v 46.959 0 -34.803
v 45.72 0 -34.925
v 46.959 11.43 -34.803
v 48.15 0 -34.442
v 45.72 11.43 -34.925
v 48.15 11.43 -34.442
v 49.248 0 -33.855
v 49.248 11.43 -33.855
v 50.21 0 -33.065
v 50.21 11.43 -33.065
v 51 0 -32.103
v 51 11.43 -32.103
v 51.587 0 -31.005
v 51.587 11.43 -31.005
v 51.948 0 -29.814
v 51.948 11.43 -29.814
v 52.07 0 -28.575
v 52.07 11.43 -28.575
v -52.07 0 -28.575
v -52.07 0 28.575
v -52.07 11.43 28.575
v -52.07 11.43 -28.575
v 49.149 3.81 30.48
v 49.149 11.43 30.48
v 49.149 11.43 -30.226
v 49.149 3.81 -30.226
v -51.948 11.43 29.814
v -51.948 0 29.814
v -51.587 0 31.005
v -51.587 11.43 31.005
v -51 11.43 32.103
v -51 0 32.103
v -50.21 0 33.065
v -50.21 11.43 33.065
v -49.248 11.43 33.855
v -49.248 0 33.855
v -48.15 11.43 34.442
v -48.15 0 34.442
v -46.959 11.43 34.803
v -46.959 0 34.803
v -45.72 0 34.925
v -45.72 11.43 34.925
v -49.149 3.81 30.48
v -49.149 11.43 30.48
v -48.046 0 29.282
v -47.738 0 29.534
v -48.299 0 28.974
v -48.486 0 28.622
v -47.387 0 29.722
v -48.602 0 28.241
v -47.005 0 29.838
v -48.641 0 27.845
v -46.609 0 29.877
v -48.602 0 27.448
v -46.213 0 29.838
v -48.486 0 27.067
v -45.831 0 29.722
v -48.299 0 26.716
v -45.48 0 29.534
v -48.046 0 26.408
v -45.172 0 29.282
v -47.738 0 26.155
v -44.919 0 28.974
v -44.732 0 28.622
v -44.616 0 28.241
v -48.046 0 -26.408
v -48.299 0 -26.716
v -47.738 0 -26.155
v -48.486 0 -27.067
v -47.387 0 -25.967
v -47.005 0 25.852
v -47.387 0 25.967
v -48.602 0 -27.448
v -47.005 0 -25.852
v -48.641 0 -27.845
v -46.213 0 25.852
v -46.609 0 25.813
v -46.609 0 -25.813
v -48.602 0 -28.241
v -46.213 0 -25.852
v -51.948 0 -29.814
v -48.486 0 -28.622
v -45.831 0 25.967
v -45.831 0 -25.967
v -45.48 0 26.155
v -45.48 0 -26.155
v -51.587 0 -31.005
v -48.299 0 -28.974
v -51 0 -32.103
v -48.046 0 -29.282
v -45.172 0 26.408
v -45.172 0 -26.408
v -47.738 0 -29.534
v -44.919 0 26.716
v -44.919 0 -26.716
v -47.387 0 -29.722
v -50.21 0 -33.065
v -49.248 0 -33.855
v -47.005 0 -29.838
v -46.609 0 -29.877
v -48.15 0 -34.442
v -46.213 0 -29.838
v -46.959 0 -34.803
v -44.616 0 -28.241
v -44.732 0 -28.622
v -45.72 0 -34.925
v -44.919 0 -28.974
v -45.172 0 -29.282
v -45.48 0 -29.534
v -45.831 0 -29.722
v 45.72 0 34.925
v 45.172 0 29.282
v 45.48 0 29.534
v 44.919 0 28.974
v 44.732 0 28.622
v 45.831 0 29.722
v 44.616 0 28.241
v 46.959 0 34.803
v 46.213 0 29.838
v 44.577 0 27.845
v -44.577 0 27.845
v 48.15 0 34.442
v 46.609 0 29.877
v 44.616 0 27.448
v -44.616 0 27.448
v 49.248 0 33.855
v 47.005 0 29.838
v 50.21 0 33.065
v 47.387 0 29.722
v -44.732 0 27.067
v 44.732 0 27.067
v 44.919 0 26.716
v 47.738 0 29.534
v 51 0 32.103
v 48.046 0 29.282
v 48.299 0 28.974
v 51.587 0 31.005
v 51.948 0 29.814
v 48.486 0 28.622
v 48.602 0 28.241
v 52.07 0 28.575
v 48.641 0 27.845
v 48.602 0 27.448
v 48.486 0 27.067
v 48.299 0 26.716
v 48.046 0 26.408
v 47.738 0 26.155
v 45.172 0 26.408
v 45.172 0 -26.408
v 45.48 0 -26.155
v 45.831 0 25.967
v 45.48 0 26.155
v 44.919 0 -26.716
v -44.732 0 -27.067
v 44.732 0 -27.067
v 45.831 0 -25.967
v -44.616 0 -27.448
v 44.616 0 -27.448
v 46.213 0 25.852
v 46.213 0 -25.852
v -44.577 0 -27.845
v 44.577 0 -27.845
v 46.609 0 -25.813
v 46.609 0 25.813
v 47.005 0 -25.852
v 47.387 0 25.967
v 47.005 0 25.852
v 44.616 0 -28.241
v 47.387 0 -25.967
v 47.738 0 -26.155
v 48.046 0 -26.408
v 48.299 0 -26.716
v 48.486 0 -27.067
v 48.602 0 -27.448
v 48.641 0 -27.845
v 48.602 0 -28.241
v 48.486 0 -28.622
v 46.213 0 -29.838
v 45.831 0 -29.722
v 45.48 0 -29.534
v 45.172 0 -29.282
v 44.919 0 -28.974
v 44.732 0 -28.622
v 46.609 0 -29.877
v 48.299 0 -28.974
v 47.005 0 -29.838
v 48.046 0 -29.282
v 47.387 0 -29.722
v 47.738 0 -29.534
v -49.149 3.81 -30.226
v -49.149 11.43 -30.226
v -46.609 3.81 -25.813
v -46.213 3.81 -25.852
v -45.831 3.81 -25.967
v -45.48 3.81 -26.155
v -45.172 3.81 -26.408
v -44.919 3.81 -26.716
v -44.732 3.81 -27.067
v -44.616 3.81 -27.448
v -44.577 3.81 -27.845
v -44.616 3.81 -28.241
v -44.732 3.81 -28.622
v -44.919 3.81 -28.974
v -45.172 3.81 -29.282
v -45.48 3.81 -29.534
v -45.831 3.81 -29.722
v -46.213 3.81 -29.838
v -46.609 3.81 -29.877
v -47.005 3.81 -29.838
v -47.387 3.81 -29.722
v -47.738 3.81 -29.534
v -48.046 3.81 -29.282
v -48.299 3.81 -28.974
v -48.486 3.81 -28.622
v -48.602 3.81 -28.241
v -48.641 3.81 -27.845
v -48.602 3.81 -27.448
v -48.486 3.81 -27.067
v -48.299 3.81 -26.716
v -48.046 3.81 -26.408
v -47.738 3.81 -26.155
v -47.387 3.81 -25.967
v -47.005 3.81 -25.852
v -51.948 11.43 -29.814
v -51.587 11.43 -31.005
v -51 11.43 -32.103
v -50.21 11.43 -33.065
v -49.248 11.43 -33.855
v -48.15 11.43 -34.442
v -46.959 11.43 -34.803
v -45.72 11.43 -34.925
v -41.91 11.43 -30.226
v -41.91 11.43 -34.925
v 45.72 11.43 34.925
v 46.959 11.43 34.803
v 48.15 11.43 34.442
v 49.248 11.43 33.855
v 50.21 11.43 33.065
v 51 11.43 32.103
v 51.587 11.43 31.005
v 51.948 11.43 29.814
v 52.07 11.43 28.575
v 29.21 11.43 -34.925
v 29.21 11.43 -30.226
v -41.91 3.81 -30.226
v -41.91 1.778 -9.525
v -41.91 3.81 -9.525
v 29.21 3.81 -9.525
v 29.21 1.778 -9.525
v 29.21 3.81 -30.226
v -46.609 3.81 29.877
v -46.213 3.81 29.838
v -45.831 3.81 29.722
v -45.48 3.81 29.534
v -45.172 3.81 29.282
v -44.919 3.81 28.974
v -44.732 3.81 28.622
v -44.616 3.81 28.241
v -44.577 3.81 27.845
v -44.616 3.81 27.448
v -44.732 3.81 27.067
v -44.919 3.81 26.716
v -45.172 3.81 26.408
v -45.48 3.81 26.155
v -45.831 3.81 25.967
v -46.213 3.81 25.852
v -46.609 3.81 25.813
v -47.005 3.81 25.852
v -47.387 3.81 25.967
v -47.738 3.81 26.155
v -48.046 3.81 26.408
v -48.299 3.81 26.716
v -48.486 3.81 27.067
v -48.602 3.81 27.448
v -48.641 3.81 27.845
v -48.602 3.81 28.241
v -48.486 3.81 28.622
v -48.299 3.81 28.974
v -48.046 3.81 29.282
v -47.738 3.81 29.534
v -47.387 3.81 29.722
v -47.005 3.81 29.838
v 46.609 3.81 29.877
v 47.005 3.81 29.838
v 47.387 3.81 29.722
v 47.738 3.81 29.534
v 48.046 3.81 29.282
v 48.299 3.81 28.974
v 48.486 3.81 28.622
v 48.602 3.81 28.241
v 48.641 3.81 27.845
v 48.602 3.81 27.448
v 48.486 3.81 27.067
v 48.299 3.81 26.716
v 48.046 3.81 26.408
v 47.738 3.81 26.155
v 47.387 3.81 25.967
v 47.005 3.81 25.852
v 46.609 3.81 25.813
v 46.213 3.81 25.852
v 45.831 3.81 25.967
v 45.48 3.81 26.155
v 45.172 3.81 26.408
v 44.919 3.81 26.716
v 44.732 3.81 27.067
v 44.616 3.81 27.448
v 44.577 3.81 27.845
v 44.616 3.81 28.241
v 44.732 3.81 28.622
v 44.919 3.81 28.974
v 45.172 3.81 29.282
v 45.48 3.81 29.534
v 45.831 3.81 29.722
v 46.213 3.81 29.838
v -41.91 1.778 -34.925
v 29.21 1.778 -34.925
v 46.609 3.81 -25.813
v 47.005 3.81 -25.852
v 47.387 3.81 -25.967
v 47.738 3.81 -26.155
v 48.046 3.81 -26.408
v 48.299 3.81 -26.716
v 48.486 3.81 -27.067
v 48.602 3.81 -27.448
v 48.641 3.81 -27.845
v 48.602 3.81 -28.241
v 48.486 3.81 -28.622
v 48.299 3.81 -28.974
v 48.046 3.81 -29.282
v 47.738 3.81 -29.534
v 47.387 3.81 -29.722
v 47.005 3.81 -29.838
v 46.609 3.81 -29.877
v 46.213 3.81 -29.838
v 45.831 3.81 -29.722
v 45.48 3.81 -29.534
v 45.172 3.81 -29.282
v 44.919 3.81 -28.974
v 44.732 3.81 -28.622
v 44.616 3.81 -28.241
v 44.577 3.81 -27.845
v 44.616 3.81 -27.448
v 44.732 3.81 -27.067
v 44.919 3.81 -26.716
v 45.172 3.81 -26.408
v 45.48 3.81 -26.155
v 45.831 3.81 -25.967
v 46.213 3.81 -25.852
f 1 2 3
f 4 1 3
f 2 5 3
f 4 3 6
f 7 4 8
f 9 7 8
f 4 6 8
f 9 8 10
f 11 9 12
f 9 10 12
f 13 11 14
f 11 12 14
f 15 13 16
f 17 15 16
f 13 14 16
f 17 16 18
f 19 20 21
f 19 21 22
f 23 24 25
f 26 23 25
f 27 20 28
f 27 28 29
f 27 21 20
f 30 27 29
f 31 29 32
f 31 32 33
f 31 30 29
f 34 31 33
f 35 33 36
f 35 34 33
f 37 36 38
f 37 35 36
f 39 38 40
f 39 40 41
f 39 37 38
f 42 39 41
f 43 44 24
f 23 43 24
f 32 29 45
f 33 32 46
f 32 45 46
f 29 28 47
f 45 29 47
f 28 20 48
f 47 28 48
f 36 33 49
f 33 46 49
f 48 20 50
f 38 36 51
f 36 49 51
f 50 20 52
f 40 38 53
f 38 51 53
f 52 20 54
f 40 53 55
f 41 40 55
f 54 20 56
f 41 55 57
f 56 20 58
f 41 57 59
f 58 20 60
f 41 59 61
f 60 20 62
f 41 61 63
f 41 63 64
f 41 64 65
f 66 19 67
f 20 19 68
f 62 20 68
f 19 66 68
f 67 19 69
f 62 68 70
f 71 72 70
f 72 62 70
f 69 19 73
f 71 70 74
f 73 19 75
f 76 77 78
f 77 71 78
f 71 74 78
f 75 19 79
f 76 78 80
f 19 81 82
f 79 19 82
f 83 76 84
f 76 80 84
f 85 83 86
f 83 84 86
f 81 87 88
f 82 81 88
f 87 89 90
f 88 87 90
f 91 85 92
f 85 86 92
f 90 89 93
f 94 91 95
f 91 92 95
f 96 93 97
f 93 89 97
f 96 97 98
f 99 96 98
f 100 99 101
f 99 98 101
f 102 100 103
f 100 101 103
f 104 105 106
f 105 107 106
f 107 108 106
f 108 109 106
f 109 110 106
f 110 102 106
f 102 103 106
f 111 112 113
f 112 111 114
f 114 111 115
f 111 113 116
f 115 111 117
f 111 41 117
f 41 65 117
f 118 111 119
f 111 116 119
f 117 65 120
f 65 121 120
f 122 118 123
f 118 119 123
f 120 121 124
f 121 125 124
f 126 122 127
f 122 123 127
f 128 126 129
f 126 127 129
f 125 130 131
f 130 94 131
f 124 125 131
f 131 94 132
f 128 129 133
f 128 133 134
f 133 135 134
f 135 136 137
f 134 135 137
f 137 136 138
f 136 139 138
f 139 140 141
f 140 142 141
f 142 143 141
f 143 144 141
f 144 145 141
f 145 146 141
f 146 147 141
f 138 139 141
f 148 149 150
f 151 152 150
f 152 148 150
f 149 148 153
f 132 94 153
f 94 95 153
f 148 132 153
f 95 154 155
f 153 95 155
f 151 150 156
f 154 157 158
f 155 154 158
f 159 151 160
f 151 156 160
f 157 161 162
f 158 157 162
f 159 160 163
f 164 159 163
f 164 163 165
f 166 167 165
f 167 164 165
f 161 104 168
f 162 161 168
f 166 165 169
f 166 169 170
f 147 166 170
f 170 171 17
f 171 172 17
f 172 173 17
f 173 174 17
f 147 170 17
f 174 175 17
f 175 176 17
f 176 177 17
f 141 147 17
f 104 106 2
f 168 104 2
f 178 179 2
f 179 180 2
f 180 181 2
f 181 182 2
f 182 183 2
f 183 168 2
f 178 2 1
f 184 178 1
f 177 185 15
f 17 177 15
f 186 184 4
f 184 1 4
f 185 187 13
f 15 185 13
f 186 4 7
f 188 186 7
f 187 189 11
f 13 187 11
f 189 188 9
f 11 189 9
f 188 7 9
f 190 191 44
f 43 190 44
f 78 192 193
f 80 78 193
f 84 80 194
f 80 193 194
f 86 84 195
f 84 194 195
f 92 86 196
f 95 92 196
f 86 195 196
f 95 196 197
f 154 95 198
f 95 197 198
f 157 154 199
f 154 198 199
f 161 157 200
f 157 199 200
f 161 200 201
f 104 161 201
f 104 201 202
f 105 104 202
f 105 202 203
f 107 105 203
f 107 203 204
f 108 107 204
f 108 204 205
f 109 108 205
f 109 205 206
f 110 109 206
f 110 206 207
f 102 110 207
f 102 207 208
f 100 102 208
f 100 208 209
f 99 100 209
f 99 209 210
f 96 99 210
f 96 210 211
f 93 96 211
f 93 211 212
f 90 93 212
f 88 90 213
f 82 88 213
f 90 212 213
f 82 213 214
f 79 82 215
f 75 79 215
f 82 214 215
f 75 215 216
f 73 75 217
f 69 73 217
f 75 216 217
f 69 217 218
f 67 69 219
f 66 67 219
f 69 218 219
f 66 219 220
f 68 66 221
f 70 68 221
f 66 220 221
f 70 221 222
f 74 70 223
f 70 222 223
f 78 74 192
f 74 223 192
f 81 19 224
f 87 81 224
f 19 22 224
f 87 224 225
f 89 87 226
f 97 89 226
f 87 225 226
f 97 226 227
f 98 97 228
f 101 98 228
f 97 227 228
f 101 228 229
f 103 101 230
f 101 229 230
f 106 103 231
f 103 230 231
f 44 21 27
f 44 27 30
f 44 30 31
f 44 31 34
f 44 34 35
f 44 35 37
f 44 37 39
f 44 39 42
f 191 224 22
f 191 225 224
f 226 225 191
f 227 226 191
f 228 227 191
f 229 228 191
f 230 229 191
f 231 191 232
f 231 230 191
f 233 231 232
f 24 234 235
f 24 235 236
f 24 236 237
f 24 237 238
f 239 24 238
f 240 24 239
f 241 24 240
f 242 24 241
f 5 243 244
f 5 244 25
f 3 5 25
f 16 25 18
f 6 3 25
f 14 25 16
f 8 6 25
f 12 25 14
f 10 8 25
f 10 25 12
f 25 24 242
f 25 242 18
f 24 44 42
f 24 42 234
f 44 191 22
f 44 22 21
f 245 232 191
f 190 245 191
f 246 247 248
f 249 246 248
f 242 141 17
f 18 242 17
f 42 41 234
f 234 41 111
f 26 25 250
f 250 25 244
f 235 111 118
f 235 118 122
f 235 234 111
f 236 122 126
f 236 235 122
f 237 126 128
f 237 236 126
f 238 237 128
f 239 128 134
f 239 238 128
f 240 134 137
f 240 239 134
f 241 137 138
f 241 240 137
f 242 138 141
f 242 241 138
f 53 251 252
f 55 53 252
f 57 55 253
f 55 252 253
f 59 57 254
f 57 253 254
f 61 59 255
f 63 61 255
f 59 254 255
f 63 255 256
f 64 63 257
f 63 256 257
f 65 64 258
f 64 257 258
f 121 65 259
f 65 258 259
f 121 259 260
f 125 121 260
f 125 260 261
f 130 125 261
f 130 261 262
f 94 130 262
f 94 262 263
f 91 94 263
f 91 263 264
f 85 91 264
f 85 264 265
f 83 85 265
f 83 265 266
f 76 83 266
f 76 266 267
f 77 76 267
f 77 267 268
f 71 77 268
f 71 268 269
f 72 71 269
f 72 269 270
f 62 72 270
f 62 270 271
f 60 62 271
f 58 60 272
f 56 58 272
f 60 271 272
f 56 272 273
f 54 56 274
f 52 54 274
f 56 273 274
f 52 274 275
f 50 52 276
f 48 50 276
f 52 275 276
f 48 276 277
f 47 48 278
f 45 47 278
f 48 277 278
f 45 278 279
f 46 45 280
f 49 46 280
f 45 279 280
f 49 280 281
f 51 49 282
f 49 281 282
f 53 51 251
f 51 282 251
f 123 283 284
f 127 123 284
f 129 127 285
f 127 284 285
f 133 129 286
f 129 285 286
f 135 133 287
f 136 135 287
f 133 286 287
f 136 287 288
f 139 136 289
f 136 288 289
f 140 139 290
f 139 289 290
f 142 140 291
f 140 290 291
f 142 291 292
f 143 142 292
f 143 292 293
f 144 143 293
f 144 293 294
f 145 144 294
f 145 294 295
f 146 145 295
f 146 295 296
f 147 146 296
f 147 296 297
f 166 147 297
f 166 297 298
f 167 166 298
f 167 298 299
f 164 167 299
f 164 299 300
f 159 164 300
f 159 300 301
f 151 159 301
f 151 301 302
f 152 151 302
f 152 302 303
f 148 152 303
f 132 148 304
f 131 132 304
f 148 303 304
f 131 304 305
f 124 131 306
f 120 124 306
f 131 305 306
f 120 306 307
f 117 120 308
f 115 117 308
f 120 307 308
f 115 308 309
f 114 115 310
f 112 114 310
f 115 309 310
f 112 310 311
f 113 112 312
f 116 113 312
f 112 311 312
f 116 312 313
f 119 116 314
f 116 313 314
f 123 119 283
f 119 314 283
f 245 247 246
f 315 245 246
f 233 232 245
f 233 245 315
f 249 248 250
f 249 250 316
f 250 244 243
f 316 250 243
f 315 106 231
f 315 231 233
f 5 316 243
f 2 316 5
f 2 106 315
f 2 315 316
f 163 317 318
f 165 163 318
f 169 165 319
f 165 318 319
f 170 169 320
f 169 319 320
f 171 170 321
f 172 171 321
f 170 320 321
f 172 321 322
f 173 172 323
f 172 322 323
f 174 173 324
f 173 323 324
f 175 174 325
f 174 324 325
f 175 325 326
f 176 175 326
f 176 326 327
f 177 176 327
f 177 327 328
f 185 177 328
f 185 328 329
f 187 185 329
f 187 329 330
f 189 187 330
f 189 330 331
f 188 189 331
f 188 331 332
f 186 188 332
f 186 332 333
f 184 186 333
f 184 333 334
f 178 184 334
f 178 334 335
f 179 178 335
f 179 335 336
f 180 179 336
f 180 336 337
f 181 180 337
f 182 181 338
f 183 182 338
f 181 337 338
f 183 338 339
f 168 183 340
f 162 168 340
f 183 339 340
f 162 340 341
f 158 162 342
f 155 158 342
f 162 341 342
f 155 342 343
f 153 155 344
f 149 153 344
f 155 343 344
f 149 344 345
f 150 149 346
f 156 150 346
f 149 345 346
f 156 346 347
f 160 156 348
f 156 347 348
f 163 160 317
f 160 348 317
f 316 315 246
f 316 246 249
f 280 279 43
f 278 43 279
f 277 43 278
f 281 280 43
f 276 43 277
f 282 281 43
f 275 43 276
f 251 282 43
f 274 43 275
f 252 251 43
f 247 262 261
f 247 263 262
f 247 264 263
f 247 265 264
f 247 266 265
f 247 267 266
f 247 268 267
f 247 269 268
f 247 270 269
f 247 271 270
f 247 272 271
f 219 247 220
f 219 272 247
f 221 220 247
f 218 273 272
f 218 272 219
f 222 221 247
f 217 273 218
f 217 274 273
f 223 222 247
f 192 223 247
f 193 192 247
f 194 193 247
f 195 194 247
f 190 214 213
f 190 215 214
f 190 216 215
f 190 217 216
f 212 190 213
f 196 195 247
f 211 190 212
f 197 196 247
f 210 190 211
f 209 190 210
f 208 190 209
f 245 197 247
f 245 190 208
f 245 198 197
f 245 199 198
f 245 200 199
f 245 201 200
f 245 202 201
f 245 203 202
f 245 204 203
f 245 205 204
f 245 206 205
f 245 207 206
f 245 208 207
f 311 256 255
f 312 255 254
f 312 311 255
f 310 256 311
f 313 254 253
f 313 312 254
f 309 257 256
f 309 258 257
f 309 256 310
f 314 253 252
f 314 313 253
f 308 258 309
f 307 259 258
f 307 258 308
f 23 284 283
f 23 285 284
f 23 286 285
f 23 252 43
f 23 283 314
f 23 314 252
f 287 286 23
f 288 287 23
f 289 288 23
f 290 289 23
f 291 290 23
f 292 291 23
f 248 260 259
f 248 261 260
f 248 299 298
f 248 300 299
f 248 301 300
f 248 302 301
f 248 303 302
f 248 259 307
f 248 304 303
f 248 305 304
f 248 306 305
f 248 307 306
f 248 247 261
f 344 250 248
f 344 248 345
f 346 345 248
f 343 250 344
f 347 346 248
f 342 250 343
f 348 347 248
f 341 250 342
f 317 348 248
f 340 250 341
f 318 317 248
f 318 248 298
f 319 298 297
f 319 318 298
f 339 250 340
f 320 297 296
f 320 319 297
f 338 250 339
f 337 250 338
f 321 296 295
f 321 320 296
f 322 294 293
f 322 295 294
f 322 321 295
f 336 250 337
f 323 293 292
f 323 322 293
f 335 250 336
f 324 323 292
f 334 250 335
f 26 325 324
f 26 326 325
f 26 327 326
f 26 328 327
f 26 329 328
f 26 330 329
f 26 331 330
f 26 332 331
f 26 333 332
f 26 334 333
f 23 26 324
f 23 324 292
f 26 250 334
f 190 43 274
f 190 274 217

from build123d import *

# Parameters (mm, degrees)
SKETCH2_W           = 104.14
SKETCH2_H           = 69.85
BOSS_EXTRUDE1_DEPTH = 11.43
SKETCH3_W           = 71.12
SKETCH3_H           = 28.179594488
CUT_EXTRUDE1_DEPTH  = 9.652
CUT_EXTRUDE2_DEPTH  = 7.62
SKETCH5_R           = 2.032
CUT_EXTRUDE3_DEPTH  = 12.7
FILLET1_R           = 6.35


with BuildPart() as part:
    # Sketch2 → Boss-Extrude1 (new body)
    with BuildSketch(Plane(origin=(0, 0, 0), x_dir=(1, 0, 0), z_dir=(0, 1, 0))):
        Rectangle(SKETCH2_W, SKETCH2_H)
    extrude(amount=BOSS_EXTRUDE1_DEPTH)

    # Sketch3 → Cut-Extrude1 (cut)
    with BuildSketch(Plane(origin=(0, 11.43, 0), x_dir=(1, 0, 0), z_dir=(0, 1, 0))):
        with Locations((-6.35, 23.614797244)):
            Rectangle(SKETCH3_W, SKETCH3_H)
    extrude(amount=-CUT_EXTRUDE1_DEPTH, mode=Mode.SUBTRACT)

    # Sketch4 → Cut-Extrude2 (cut)
    with BuildSketch(Plane(origin=(0, 11.43, 0), x_dir=(1, 0, 0), z_dir=(0, 1, 0))):
        Polygon((49.149, 30.226), (-49.149, 30.226), (-49.149, -30.226), (-49.149, -30.48), (49.149, -30.48), (49.149, -30.226), align=None)
    extrude(amount=-CUT_EXTRUDE2_DEPTH, mode=Mode.SUBTRACT)

    # Sketch5 → Cut-Extrude3 (cut)
    with BuildSketch(Plane(origin=(0, 11.43, 0), x_dir=(1, 0, 0), z_dir=(0, 1, 0))):
        with Locations(Location((-46.609, 27.84475, 0), (0, 0, 270))):
            Circle(SKETCH5_R)
        with Locations(Location((46.609, 27.84475, 0), (0, 0, 270))):
            Circle(SKETCH5_R)
        with Locations(Location((46.609, -27.84475, 0), (0, 0, 270))):
            Circle(SKETCH5_R)
        with Locations(Location((-46.609, -27.84475, 0), (0, 0, 270))):
            Circle(SKETCH5_R)
    extrude(amount=-CUT_EXTRUDE3_DEPTH, mode=Mode.SUBTRACT)

    # Fillet1
    fillet1_edges = [part.edges().sort_by_distance(p)[0] for p in [
        (-52.07, 5.715, -34.925),
        (52.07, 5.715, -34.925),
        (52.07, 5.715, 34.925),
        (-52.07, 5.715, 34.925),
    ]]
    fillet(fillet1_edges, radius=FILLET1_R)


solid = part.part
